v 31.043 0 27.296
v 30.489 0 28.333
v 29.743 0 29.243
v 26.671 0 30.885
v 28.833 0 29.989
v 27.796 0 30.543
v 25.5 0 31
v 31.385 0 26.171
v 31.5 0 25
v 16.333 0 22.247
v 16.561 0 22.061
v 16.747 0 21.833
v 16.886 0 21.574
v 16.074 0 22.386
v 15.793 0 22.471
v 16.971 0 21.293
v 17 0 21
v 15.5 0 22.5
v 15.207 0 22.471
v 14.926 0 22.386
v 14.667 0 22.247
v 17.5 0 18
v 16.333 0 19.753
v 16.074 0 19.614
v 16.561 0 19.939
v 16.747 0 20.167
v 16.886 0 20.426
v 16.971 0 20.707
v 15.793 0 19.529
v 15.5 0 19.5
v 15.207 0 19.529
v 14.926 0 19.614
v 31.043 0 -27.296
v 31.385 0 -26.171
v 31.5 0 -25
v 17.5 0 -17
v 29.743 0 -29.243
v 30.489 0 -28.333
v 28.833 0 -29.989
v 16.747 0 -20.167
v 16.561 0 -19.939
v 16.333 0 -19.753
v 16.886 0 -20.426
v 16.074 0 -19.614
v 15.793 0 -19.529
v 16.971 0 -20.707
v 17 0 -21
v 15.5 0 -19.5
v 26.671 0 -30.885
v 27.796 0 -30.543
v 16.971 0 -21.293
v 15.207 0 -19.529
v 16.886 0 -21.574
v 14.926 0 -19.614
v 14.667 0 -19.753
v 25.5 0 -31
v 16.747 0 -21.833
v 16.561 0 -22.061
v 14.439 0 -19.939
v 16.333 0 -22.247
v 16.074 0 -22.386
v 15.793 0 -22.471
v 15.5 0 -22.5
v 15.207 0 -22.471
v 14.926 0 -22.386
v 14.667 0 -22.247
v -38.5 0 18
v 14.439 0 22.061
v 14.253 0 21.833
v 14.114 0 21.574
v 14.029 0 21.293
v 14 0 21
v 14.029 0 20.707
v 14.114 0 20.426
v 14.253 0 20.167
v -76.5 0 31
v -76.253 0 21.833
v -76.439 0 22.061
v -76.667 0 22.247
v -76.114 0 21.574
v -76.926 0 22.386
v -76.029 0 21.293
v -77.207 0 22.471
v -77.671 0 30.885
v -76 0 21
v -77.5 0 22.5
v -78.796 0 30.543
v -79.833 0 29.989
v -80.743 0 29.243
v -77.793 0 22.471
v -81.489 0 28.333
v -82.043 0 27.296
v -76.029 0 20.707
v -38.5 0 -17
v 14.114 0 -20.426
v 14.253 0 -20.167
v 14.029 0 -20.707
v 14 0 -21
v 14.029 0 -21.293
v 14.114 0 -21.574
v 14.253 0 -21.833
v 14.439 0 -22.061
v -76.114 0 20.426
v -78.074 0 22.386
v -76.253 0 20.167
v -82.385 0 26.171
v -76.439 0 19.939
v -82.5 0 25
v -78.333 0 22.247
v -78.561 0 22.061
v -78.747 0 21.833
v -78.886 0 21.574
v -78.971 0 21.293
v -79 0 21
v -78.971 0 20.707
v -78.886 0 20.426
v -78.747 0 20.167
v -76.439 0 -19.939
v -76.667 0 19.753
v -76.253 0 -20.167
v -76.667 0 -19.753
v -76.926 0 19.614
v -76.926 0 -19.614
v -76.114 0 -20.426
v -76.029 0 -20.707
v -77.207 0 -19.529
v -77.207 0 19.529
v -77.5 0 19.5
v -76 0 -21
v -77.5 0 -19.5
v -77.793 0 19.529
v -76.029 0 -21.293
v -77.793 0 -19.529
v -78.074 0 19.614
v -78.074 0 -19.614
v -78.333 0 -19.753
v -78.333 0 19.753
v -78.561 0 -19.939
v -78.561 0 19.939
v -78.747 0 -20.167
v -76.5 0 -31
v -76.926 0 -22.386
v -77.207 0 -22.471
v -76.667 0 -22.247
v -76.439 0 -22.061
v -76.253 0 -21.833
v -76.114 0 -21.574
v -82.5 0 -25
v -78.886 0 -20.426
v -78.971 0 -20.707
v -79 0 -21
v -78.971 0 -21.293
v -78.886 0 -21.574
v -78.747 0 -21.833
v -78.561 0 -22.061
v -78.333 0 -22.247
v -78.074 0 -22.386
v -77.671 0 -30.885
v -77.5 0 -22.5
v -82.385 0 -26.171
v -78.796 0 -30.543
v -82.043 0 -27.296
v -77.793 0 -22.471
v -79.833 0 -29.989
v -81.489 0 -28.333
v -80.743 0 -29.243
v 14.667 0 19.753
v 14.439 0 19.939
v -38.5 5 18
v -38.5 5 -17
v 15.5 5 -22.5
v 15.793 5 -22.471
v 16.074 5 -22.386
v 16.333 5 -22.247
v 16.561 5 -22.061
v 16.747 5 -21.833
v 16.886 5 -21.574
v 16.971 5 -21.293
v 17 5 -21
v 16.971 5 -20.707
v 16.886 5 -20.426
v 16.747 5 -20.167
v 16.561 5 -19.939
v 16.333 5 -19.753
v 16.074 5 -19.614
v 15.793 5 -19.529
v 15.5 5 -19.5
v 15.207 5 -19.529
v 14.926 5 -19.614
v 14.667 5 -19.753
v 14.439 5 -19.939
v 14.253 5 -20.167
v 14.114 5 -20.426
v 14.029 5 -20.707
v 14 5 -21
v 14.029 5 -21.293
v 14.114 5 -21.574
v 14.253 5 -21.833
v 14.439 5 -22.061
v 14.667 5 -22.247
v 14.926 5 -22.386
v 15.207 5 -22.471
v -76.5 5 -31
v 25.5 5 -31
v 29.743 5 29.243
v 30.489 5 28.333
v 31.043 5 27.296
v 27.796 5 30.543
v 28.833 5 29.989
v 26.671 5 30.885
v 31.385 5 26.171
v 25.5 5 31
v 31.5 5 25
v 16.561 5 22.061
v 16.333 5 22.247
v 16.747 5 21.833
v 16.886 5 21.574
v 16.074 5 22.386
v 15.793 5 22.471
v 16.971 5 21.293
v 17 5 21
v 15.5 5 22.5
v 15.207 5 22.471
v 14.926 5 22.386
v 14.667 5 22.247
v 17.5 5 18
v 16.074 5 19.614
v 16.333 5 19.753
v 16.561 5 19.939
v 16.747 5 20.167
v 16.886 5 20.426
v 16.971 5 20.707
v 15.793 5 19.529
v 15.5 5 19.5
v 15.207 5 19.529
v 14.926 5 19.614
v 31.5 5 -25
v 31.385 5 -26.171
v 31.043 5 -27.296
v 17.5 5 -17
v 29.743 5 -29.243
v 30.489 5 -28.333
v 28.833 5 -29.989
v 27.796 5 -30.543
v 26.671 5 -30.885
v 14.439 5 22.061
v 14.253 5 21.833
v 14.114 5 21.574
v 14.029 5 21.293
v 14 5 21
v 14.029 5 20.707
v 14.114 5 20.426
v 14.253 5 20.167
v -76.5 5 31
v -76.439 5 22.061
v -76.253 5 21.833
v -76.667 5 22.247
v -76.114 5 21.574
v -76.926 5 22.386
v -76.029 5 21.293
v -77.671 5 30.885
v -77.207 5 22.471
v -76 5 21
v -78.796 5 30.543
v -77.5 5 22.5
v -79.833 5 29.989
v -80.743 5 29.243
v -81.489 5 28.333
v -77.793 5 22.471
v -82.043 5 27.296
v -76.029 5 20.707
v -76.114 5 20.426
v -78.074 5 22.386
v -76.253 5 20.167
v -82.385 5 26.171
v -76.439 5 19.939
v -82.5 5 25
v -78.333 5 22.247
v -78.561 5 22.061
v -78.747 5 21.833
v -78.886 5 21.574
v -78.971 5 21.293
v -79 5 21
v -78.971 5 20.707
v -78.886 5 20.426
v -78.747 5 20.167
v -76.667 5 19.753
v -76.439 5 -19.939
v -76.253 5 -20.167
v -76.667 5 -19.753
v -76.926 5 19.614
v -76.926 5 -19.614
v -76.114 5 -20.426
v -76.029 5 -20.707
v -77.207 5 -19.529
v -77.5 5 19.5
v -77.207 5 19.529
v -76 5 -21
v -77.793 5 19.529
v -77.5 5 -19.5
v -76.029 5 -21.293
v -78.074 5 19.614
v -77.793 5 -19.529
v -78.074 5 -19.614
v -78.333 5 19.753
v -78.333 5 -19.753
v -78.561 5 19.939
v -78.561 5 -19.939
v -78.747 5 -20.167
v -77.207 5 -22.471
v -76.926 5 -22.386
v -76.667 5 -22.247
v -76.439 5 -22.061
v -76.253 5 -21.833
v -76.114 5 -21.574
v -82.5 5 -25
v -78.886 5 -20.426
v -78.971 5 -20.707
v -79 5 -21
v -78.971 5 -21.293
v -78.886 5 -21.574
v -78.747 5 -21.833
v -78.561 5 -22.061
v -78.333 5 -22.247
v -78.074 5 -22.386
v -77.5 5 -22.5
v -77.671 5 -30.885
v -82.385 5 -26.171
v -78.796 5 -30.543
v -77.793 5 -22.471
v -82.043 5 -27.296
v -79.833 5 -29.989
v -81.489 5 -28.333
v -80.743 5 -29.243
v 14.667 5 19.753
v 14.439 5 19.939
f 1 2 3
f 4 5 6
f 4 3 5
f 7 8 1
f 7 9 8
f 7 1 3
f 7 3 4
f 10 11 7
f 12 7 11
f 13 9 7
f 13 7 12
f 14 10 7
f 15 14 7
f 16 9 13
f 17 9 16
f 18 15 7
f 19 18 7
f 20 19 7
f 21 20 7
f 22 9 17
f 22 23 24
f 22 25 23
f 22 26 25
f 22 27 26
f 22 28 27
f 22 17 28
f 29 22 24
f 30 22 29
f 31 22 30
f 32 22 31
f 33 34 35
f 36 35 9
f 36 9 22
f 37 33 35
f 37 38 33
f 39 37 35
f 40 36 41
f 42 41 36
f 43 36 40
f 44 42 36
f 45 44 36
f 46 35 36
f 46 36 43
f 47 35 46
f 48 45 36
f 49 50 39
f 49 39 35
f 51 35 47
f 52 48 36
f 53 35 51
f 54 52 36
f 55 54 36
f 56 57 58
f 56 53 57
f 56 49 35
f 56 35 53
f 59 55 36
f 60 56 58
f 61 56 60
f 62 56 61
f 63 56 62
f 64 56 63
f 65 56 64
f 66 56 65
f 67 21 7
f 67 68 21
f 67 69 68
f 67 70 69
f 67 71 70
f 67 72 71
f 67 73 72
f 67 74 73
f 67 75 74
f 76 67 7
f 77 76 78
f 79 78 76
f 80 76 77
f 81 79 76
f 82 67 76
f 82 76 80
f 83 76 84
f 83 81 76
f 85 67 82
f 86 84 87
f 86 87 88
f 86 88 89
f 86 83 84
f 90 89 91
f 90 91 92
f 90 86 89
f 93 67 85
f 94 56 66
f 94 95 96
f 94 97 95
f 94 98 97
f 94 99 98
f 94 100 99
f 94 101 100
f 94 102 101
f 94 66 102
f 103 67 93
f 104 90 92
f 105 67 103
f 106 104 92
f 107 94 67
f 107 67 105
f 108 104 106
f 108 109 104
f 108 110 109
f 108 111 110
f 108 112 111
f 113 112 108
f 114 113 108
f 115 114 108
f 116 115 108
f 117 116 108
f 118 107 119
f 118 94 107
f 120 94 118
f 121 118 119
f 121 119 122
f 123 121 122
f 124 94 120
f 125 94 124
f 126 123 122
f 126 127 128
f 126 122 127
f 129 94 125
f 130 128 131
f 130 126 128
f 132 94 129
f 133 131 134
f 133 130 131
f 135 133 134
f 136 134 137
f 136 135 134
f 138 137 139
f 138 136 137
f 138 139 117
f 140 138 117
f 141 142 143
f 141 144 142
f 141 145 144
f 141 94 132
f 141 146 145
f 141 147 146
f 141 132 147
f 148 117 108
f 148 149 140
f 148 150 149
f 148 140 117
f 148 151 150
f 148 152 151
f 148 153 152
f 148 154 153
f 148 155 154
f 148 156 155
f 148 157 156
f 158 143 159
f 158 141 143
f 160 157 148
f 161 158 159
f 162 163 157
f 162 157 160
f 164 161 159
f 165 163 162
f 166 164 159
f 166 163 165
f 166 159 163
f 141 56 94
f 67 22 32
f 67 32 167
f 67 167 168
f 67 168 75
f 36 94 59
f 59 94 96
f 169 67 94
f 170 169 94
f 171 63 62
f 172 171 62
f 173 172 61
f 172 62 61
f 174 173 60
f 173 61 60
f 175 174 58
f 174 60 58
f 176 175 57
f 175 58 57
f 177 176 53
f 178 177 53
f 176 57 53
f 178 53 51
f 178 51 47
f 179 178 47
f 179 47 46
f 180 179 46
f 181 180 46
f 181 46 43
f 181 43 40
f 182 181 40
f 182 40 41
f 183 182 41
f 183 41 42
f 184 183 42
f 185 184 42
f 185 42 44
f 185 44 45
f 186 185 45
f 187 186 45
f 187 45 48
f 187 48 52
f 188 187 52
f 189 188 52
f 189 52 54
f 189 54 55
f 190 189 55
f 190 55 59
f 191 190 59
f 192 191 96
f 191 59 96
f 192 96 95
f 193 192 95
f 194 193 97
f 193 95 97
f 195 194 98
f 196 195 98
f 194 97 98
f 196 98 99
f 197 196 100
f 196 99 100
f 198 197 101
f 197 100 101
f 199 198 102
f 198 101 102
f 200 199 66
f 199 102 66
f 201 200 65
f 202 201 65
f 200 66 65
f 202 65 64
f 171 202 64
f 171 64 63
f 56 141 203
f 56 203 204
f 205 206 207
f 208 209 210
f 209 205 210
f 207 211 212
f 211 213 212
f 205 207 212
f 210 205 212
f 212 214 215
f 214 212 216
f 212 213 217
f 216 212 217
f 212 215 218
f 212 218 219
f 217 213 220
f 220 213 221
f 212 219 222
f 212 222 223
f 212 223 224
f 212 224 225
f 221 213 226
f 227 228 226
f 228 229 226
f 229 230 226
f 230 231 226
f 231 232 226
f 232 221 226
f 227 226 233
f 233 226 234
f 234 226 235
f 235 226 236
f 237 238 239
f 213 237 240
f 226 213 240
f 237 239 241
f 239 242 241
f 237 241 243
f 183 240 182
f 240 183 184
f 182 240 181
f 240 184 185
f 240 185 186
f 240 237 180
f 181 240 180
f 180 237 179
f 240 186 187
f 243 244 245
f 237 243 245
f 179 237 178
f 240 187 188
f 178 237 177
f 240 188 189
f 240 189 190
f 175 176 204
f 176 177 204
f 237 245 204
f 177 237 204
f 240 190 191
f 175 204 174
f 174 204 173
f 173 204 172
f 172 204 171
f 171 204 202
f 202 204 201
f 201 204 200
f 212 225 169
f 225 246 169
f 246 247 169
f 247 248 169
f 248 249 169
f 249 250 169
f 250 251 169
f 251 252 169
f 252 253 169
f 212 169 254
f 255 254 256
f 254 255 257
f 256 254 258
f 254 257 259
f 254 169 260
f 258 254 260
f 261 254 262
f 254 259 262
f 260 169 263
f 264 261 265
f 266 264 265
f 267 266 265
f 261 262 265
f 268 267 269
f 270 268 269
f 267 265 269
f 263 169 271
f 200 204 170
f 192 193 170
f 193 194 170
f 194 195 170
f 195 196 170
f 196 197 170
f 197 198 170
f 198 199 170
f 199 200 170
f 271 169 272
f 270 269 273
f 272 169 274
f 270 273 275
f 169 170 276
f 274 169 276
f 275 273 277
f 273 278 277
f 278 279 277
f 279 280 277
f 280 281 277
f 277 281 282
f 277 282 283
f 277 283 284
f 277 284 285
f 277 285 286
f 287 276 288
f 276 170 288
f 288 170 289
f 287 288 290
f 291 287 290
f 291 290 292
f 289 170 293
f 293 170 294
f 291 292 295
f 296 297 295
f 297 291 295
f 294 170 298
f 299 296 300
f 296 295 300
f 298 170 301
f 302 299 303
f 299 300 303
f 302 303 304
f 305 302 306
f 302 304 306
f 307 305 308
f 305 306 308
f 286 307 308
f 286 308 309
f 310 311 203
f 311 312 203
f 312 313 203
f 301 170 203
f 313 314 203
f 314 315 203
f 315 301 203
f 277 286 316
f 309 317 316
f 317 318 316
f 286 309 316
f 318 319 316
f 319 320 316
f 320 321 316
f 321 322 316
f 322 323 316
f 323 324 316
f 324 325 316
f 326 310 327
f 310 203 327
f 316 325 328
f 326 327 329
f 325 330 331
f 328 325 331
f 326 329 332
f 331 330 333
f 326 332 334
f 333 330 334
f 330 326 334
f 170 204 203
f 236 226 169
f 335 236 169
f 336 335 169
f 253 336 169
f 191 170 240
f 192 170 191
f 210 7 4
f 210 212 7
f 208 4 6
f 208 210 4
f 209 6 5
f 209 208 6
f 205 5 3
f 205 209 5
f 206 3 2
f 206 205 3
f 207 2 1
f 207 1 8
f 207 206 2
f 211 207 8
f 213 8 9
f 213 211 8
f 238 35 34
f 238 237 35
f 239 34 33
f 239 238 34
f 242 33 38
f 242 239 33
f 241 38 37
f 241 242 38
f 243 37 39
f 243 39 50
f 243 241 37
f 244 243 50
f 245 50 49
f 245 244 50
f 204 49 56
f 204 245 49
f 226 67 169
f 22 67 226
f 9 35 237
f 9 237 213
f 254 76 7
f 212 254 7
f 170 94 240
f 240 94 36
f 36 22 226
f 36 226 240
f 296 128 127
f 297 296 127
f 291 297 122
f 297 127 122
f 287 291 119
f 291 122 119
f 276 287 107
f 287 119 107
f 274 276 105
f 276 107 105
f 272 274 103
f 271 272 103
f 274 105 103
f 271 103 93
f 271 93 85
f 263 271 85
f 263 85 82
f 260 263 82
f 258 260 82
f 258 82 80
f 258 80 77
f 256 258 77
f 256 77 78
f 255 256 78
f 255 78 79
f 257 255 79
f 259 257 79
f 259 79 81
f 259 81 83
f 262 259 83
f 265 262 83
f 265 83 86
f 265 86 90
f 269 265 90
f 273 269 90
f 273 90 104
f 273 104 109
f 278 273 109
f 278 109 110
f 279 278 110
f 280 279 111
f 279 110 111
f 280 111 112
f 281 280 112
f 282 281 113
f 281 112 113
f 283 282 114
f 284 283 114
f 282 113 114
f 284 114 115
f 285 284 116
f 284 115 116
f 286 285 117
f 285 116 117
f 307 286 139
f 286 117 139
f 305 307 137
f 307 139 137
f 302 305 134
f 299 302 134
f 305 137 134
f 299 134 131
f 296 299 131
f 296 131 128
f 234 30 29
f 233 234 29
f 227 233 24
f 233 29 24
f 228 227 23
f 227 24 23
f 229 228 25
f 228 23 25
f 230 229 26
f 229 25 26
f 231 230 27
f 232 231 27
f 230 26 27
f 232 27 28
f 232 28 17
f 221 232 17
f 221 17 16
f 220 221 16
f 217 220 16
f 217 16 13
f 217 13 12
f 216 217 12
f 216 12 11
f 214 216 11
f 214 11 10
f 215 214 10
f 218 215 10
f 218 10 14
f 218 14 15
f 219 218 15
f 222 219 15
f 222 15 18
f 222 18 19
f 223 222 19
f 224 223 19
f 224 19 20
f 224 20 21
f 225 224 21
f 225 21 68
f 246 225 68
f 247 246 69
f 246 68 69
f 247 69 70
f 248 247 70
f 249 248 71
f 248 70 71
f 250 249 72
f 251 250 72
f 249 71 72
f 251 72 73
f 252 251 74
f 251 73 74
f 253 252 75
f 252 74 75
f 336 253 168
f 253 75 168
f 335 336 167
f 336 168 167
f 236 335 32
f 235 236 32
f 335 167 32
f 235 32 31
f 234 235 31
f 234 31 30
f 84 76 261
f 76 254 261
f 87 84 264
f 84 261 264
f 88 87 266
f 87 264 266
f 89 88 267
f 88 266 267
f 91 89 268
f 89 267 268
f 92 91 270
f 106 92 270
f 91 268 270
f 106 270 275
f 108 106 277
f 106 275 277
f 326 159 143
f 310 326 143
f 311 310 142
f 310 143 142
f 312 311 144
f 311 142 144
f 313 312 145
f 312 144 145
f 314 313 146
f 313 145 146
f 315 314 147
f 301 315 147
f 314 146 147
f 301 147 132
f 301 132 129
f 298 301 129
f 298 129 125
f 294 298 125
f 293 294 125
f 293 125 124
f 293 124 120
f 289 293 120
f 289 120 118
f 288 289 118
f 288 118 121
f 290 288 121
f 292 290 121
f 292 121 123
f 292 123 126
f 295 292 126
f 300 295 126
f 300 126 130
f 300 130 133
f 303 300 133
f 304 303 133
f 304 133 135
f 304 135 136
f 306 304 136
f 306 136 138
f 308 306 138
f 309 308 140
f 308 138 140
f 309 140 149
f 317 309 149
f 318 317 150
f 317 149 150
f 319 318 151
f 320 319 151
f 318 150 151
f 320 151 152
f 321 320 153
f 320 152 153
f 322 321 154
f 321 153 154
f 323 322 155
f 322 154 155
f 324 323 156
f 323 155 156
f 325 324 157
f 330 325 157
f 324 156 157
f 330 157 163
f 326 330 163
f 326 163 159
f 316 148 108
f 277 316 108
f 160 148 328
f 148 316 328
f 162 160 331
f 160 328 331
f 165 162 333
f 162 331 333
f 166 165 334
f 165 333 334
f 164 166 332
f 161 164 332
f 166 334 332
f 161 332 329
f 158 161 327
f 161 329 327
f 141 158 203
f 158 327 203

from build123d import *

# Parameters (mm, degrees)
SKETCH_1_W          = 56
SKETCH_1_H          = 35
EXTRUDE_1_DEPTH     = 5
SKETCH_3_R          = 1.5
CUT_EXTRUDE_1_DEPTH = 10
FILLET_1_R          = 6


with BuildPart() as part:
    # Эскиз1 → Бобышка-Вытянуть1 (new body)
    with BuildSketch(Plane(origin=(0, 0, 0), x_dir=(1, 0, 0), z_dir=(0, 1, 0))):
        Polygon((-31.5, -31), (-82.5, -31), (-82.5, 21), (-82.5, 31), (31.5, 31), (31.5, -31), align=None)
        with Locations((-10.5, -0.5)):
            Rectangle(SKETCH_1_W, SKETCH_1_H, mode=Mode.SUBTRACT)
    extrude(amount=EXTRUDE_1_DEPTH)

    # Эскиз3 → Вырез-Вытянуть1 (cut)
    with BuildSketch(Plane.XZ):
        with Locations(Location((15.5, 21, 0), (0, 0, 270))):
            Circle(SKETCH_3_R)
        with Locations(Location((15.5, -21, 0), (0, 0, 270))):
            Circle(SKETCH_3_R)
        with Locations(Location((-77.5, 21, 0), (0, 0, 270))):
            Circle(SKETCH_3_R)
        with Locations(Location((-77.5, -21, 0), (0, 0, 270))):
            Circle(SKETCH_3_R)
    extrude(amount=-CUT_EXTRUDE_1_DEPTH, mode=Mode.SUBTRACT)

    # Скругление1
    fillet_1_edges = [part.edges().sort_by_distance(p)[0] for p in [
        (-82.5, 2.5, 31),
        (-82.5, 2.5, -31),
        (31.5, 2.5, -31),
        (31.5, 2.5, 31),
    ]]
    fillet(fillet_1_edges, radius=FILLET_1_R)


solid = part.part
